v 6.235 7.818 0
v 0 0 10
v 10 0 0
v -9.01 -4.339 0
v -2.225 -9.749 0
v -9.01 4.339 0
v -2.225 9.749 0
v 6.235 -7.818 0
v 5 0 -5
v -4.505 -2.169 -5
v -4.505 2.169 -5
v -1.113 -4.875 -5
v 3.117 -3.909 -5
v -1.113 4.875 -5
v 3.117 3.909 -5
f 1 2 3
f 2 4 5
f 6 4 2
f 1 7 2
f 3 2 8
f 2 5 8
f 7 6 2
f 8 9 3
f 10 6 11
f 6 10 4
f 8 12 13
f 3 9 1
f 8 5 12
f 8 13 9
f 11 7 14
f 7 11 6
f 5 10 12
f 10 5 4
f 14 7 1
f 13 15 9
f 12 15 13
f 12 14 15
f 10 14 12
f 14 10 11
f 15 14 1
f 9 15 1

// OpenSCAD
//Diamonds
//
h=15;
//Lateral faces (I think the best is to use a number between 5 and 8)
f=7;
color([0.9,0,0])
union()
{
cylinder(r1=(2/3)*h,r2=0,h=(2/3)*h,$fn=f);
rotate([180,0,0])
cylinder(r1=(2/3)*h,r2=(1/3)*h,h=(1/3)*h,$fn=f);
}
